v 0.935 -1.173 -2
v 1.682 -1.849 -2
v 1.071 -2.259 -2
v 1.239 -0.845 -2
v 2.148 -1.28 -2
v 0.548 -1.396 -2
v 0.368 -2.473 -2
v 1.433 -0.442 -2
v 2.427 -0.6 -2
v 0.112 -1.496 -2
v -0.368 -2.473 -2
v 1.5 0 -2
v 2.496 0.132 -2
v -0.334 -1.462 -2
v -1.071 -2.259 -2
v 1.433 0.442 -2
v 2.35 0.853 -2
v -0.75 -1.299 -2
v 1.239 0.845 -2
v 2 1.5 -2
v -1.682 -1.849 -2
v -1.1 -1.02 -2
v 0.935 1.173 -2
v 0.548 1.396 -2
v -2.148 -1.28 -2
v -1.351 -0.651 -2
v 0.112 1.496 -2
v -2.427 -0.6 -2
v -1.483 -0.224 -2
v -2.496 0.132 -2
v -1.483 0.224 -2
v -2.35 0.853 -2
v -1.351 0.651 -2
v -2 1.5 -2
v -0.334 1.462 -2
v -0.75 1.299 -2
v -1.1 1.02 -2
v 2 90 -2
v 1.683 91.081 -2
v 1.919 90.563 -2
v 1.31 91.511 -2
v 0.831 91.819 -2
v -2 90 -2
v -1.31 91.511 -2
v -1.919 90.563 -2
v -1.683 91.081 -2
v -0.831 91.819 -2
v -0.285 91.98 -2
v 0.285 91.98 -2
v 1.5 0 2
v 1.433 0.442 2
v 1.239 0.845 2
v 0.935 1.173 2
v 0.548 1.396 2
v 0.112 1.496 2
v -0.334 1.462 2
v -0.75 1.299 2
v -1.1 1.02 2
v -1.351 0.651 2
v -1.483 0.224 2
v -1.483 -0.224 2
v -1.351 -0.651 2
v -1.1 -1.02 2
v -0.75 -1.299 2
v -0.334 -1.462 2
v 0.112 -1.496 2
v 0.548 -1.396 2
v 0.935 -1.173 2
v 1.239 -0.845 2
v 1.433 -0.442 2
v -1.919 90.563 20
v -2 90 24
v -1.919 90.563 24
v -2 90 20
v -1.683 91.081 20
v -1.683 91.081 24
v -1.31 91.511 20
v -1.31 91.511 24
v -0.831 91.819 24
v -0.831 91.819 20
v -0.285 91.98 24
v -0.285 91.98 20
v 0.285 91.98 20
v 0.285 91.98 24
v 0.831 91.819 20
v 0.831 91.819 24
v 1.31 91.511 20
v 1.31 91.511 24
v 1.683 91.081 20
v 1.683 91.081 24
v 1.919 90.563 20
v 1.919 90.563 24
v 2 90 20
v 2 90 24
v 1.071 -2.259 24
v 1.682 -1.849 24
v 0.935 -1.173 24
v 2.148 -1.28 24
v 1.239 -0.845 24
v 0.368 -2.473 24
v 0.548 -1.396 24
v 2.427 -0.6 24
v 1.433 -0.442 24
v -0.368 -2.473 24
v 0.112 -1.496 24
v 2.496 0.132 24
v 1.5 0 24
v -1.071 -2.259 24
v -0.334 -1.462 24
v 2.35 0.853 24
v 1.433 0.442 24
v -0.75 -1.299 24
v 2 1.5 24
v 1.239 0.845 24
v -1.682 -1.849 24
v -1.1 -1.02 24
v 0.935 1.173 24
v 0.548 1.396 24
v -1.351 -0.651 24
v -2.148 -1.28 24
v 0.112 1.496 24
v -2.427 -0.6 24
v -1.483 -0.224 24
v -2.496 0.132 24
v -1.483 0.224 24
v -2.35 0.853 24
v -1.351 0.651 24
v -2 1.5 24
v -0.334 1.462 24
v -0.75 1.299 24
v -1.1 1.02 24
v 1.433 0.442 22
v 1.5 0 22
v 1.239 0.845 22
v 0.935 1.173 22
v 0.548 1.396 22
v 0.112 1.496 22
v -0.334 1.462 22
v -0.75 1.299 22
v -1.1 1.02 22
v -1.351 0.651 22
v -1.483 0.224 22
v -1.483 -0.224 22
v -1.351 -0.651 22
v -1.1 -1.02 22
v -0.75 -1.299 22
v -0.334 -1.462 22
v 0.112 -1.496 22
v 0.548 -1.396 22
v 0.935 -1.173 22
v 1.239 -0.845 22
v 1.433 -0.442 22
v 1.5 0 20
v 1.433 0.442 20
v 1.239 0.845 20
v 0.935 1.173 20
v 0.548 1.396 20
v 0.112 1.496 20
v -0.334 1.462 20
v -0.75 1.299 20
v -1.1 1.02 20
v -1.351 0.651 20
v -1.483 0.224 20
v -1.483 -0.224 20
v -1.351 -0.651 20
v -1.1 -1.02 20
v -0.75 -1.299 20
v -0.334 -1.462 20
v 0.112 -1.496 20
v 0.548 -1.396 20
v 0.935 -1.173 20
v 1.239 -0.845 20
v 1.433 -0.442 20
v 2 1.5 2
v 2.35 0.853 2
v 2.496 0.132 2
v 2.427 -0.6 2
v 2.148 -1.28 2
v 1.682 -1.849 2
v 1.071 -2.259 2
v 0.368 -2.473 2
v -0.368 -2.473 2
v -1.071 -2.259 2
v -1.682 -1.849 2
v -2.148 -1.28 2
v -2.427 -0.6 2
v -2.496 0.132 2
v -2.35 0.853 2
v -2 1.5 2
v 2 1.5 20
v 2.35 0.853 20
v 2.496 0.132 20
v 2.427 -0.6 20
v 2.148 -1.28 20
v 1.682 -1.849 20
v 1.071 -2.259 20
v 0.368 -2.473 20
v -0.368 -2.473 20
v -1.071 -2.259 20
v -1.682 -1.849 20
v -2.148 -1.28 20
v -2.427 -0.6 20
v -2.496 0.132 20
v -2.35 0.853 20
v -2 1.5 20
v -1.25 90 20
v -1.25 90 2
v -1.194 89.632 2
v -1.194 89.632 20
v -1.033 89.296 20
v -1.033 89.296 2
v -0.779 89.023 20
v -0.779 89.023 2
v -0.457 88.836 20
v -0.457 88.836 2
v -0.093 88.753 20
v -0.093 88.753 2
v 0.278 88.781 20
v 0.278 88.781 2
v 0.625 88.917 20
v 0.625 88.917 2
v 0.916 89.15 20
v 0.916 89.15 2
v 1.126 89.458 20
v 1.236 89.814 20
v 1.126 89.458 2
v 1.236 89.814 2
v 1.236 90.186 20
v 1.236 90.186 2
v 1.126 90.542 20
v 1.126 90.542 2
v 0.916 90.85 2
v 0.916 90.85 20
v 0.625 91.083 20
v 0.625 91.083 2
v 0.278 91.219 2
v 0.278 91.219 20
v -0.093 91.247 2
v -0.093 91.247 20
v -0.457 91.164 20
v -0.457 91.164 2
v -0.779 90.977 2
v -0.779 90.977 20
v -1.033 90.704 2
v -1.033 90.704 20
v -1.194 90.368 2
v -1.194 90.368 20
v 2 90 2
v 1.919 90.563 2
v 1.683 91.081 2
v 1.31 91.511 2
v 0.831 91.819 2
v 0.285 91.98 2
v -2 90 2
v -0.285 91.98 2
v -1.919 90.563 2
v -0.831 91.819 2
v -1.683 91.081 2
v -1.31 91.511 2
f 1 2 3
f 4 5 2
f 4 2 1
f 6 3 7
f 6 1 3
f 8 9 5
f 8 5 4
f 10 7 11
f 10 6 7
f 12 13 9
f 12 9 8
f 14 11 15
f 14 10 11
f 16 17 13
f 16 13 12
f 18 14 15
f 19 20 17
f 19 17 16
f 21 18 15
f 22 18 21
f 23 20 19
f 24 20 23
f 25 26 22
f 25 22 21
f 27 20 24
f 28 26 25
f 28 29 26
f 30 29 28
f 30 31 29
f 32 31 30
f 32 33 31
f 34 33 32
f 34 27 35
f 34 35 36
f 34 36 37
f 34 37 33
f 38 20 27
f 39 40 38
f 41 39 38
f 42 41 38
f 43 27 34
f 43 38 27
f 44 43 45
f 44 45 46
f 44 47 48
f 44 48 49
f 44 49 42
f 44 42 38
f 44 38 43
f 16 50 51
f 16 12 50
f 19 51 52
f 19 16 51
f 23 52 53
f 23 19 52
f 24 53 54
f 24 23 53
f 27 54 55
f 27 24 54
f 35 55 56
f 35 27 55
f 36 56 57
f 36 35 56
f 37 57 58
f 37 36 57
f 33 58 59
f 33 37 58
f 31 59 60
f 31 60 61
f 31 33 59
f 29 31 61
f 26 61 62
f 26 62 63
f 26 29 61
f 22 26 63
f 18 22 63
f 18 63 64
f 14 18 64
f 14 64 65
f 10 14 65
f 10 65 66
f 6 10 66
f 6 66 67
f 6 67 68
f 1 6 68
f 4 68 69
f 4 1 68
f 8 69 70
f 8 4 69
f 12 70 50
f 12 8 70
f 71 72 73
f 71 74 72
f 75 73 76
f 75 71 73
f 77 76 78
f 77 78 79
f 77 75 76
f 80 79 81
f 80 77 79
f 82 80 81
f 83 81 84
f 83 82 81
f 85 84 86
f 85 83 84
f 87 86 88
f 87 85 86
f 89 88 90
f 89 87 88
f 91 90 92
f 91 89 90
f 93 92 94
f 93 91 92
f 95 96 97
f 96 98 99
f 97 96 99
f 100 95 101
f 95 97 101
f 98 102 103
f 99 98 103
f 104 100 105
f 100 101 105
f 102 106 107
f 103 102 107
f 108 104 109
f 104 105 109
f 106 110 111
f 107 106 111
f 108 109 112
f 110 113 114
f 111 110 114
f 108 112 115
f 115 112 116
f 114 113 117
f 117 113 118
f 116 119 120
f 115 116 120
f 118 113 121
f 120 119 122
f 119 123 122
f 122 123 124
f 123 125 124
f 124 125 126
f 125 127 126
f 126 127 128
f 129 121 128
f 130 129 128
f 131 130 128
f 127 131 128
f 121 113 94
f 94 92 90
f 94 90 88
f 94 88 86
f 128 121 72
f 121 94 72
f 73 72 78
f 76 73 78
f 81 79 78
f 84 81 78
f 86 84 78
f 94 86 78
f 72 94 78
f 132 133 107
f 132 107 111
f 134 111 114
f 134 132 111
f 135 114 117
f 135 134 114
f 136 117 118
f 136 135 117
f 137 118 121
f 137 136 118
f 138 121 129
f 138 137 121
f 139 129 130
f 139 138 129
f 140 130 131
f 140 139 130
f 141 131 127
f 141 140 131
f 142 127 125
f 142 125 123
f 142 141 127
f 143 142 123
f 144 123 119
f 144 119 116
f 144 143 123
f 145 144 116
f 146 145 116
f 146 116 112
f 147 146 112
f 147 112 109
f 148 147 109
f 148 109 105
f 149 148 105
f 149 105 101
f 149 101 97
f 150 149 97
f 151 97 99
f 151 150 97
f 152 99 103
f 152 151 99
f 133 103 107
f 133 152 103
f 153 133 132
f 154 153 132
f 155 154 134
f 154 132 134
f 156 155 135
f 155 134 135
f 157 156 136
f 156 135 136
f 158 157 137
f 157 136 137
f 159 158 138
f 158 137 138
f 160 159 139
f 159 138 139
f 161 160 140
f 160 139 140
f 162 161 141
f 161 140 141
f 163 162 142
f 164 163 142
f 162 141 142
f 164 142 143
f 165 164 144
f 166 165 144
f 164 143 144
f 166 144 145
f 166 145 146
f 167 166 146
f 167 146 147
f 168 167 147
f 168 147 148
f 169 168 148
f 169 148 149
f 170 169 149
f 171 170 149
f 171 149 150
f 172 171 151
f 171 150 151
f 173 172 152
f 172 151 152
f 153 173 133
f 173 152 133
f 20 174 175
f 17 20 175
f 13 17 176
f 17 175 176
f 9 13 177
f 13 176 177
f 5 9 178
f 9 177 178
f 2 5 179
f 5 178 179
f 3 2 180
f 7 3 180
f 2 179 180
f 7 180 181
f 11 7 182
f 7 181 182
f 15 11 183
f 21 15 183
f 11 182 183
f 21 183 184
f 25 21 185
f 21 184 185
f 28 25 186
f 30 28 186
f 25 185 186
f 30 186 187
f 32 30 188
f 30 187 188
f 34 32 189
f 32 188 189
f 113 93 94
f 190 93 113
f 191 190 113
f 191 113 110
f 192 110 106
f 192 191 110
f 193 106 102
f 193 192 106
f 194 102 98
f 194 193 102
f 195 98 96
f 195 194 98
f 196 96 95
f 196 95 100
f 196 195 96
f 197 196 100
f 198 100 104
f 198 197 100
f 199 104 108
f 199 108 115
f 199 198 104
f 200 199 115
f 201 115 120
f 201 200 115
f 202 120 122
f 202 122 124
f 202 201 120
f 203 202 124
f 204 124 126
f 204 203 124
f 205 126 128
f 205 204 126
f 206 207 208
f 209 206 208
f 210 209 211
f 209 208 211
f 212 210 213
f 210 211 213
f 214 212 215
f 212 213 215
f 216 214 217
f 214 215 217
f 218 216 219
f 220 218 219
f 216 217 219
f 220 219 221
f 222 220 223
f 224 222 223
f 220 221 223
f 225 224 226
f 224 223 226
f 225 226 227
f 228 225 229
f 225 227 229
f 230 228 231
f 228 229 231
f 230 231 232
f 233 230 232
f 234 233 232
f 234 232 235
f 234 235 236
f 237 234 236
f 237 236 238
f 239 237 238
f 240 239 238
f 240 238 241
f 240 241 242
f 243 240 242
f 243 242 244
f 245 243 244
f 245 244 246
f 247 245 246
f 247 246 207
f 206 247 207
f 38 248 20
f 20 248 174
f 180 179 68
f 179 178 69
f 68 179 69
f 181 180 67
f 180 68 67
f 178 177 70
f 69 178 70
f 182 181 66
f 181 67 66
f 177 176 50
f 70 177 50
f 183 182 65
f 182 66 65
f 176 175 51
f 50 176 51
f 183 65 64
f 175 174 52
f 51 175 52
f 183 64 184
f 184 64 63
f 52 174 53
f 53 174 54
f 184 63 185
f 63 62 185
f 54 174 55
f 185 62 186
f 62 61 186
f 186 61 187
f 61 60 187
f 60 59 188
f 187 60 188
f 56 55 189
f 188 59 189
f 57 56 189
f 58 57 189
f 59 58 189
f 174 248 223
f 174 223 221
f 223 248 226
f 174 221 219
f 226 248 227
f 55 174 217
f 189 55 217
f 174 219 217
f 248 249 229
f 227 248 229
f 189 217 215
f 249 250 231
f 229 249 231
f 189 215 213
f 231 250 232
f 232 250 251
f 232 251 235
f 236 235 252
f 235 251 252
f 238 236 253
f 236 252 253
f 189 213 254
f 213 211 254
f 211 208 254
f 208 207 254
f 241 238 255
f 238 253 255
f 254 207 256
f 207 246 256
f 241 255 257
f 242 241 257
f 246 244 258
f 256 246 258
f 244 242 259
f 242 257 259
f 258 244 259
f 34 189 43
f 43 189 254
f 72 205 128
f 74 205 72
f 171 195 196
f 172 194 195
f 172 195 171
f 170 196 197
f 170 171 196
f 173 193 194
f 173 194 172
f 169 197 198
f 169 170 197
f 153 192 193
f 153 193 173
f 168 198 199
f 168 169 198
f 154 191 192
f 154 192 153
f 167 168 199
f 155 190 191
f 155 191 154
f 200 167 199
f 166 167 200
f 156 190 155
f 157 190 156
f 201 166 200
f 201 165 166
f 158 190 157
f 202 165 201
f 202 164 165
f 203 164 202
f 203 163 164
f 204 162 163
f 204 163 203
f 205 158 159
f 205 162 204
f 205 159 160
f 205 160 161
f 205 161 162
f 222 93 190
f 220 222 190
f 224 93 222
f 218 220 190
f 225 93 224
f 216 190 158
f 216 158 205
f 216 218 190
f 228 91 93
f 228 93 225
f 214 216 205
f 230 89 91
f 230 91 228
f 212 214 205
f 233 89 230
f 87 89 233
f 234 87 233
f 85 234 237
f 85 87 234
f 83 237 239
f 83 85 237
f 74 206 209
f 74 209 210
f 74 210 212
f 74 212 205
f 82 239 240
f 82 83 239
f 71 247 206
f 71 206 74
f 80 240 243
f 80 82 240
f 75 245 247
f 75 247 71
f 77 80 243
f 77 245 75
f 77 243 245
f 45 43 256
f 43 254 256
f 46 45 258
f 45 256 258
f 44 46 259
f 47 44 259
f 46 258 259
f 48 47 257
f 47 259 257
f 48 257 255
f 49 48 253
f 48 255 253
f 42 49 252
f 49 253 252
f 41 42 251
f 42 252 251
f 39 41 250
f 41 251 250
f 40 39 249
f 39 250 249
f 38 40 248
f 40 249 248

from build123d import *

# Parameters (mm, degrees)
SKETCH1_R                = 1.25
SKETCH1_R_2              = 1.5
BOSS_EXTRUDE1_DEPTH      = 2
BOSS_EXTRUDE1_DEPTH_BACK = 2
SKETCH1_4_R              = 1.25
BOSS_EXTRUDE2_DEPTH      = 20


with BuildPart() as part:
    # Sketch1 → Boss-Extrude1 (new, two sides)
    with BuildSketch(Plane.XY) as boss_extrude1_sk:
        with BuildLine():
            ThreePointArc((2, 1.5), (0, -2.5), (-2, 1.5))
            Line((-2, 1.5), (-2, 90))
            ThreePointArc((-2, 90), (0, 92), (2, 90))
            Line((2, 90), (2, 1.5))
        make_face()
        with Locations((0, 90)):
            Circle(SKETCH1_R, mode=Mode.SUBTRACT)
        Circle(SKETCH1_R_2, mode=Mode.SUBTRACT)
        with Locations((0, 90)):
            Circle(SKETCH1_R)
    extrude(amount=BOSS_EXTRUDE1_DEPTH)
    extrude(boss_extrude1_sk.sketch, amount=-BOSS_EXTRUDE1_DEPTH_BACK)


with BuildPart() as body_2:
    # Mirror2: mirrored copy
    add(part.part.mirror(Plane.XY.offset(11)))


with BuildPart() as part_1:
    add(part.part)

    add(body_2.part)  # Boss-Extrude2 merges body 2
    # Sketch1<4> → Boss-Extrude2 (add)
    with BuildSketch(Plane.XY):
        with Locations(Location((0, 90, 0), (0, 0, 180))):
            Circle(SKETCH1_4_R)
    extrude(amount=BOSS_EXTRUDE2_DEPTH)


solid = part_1.part
